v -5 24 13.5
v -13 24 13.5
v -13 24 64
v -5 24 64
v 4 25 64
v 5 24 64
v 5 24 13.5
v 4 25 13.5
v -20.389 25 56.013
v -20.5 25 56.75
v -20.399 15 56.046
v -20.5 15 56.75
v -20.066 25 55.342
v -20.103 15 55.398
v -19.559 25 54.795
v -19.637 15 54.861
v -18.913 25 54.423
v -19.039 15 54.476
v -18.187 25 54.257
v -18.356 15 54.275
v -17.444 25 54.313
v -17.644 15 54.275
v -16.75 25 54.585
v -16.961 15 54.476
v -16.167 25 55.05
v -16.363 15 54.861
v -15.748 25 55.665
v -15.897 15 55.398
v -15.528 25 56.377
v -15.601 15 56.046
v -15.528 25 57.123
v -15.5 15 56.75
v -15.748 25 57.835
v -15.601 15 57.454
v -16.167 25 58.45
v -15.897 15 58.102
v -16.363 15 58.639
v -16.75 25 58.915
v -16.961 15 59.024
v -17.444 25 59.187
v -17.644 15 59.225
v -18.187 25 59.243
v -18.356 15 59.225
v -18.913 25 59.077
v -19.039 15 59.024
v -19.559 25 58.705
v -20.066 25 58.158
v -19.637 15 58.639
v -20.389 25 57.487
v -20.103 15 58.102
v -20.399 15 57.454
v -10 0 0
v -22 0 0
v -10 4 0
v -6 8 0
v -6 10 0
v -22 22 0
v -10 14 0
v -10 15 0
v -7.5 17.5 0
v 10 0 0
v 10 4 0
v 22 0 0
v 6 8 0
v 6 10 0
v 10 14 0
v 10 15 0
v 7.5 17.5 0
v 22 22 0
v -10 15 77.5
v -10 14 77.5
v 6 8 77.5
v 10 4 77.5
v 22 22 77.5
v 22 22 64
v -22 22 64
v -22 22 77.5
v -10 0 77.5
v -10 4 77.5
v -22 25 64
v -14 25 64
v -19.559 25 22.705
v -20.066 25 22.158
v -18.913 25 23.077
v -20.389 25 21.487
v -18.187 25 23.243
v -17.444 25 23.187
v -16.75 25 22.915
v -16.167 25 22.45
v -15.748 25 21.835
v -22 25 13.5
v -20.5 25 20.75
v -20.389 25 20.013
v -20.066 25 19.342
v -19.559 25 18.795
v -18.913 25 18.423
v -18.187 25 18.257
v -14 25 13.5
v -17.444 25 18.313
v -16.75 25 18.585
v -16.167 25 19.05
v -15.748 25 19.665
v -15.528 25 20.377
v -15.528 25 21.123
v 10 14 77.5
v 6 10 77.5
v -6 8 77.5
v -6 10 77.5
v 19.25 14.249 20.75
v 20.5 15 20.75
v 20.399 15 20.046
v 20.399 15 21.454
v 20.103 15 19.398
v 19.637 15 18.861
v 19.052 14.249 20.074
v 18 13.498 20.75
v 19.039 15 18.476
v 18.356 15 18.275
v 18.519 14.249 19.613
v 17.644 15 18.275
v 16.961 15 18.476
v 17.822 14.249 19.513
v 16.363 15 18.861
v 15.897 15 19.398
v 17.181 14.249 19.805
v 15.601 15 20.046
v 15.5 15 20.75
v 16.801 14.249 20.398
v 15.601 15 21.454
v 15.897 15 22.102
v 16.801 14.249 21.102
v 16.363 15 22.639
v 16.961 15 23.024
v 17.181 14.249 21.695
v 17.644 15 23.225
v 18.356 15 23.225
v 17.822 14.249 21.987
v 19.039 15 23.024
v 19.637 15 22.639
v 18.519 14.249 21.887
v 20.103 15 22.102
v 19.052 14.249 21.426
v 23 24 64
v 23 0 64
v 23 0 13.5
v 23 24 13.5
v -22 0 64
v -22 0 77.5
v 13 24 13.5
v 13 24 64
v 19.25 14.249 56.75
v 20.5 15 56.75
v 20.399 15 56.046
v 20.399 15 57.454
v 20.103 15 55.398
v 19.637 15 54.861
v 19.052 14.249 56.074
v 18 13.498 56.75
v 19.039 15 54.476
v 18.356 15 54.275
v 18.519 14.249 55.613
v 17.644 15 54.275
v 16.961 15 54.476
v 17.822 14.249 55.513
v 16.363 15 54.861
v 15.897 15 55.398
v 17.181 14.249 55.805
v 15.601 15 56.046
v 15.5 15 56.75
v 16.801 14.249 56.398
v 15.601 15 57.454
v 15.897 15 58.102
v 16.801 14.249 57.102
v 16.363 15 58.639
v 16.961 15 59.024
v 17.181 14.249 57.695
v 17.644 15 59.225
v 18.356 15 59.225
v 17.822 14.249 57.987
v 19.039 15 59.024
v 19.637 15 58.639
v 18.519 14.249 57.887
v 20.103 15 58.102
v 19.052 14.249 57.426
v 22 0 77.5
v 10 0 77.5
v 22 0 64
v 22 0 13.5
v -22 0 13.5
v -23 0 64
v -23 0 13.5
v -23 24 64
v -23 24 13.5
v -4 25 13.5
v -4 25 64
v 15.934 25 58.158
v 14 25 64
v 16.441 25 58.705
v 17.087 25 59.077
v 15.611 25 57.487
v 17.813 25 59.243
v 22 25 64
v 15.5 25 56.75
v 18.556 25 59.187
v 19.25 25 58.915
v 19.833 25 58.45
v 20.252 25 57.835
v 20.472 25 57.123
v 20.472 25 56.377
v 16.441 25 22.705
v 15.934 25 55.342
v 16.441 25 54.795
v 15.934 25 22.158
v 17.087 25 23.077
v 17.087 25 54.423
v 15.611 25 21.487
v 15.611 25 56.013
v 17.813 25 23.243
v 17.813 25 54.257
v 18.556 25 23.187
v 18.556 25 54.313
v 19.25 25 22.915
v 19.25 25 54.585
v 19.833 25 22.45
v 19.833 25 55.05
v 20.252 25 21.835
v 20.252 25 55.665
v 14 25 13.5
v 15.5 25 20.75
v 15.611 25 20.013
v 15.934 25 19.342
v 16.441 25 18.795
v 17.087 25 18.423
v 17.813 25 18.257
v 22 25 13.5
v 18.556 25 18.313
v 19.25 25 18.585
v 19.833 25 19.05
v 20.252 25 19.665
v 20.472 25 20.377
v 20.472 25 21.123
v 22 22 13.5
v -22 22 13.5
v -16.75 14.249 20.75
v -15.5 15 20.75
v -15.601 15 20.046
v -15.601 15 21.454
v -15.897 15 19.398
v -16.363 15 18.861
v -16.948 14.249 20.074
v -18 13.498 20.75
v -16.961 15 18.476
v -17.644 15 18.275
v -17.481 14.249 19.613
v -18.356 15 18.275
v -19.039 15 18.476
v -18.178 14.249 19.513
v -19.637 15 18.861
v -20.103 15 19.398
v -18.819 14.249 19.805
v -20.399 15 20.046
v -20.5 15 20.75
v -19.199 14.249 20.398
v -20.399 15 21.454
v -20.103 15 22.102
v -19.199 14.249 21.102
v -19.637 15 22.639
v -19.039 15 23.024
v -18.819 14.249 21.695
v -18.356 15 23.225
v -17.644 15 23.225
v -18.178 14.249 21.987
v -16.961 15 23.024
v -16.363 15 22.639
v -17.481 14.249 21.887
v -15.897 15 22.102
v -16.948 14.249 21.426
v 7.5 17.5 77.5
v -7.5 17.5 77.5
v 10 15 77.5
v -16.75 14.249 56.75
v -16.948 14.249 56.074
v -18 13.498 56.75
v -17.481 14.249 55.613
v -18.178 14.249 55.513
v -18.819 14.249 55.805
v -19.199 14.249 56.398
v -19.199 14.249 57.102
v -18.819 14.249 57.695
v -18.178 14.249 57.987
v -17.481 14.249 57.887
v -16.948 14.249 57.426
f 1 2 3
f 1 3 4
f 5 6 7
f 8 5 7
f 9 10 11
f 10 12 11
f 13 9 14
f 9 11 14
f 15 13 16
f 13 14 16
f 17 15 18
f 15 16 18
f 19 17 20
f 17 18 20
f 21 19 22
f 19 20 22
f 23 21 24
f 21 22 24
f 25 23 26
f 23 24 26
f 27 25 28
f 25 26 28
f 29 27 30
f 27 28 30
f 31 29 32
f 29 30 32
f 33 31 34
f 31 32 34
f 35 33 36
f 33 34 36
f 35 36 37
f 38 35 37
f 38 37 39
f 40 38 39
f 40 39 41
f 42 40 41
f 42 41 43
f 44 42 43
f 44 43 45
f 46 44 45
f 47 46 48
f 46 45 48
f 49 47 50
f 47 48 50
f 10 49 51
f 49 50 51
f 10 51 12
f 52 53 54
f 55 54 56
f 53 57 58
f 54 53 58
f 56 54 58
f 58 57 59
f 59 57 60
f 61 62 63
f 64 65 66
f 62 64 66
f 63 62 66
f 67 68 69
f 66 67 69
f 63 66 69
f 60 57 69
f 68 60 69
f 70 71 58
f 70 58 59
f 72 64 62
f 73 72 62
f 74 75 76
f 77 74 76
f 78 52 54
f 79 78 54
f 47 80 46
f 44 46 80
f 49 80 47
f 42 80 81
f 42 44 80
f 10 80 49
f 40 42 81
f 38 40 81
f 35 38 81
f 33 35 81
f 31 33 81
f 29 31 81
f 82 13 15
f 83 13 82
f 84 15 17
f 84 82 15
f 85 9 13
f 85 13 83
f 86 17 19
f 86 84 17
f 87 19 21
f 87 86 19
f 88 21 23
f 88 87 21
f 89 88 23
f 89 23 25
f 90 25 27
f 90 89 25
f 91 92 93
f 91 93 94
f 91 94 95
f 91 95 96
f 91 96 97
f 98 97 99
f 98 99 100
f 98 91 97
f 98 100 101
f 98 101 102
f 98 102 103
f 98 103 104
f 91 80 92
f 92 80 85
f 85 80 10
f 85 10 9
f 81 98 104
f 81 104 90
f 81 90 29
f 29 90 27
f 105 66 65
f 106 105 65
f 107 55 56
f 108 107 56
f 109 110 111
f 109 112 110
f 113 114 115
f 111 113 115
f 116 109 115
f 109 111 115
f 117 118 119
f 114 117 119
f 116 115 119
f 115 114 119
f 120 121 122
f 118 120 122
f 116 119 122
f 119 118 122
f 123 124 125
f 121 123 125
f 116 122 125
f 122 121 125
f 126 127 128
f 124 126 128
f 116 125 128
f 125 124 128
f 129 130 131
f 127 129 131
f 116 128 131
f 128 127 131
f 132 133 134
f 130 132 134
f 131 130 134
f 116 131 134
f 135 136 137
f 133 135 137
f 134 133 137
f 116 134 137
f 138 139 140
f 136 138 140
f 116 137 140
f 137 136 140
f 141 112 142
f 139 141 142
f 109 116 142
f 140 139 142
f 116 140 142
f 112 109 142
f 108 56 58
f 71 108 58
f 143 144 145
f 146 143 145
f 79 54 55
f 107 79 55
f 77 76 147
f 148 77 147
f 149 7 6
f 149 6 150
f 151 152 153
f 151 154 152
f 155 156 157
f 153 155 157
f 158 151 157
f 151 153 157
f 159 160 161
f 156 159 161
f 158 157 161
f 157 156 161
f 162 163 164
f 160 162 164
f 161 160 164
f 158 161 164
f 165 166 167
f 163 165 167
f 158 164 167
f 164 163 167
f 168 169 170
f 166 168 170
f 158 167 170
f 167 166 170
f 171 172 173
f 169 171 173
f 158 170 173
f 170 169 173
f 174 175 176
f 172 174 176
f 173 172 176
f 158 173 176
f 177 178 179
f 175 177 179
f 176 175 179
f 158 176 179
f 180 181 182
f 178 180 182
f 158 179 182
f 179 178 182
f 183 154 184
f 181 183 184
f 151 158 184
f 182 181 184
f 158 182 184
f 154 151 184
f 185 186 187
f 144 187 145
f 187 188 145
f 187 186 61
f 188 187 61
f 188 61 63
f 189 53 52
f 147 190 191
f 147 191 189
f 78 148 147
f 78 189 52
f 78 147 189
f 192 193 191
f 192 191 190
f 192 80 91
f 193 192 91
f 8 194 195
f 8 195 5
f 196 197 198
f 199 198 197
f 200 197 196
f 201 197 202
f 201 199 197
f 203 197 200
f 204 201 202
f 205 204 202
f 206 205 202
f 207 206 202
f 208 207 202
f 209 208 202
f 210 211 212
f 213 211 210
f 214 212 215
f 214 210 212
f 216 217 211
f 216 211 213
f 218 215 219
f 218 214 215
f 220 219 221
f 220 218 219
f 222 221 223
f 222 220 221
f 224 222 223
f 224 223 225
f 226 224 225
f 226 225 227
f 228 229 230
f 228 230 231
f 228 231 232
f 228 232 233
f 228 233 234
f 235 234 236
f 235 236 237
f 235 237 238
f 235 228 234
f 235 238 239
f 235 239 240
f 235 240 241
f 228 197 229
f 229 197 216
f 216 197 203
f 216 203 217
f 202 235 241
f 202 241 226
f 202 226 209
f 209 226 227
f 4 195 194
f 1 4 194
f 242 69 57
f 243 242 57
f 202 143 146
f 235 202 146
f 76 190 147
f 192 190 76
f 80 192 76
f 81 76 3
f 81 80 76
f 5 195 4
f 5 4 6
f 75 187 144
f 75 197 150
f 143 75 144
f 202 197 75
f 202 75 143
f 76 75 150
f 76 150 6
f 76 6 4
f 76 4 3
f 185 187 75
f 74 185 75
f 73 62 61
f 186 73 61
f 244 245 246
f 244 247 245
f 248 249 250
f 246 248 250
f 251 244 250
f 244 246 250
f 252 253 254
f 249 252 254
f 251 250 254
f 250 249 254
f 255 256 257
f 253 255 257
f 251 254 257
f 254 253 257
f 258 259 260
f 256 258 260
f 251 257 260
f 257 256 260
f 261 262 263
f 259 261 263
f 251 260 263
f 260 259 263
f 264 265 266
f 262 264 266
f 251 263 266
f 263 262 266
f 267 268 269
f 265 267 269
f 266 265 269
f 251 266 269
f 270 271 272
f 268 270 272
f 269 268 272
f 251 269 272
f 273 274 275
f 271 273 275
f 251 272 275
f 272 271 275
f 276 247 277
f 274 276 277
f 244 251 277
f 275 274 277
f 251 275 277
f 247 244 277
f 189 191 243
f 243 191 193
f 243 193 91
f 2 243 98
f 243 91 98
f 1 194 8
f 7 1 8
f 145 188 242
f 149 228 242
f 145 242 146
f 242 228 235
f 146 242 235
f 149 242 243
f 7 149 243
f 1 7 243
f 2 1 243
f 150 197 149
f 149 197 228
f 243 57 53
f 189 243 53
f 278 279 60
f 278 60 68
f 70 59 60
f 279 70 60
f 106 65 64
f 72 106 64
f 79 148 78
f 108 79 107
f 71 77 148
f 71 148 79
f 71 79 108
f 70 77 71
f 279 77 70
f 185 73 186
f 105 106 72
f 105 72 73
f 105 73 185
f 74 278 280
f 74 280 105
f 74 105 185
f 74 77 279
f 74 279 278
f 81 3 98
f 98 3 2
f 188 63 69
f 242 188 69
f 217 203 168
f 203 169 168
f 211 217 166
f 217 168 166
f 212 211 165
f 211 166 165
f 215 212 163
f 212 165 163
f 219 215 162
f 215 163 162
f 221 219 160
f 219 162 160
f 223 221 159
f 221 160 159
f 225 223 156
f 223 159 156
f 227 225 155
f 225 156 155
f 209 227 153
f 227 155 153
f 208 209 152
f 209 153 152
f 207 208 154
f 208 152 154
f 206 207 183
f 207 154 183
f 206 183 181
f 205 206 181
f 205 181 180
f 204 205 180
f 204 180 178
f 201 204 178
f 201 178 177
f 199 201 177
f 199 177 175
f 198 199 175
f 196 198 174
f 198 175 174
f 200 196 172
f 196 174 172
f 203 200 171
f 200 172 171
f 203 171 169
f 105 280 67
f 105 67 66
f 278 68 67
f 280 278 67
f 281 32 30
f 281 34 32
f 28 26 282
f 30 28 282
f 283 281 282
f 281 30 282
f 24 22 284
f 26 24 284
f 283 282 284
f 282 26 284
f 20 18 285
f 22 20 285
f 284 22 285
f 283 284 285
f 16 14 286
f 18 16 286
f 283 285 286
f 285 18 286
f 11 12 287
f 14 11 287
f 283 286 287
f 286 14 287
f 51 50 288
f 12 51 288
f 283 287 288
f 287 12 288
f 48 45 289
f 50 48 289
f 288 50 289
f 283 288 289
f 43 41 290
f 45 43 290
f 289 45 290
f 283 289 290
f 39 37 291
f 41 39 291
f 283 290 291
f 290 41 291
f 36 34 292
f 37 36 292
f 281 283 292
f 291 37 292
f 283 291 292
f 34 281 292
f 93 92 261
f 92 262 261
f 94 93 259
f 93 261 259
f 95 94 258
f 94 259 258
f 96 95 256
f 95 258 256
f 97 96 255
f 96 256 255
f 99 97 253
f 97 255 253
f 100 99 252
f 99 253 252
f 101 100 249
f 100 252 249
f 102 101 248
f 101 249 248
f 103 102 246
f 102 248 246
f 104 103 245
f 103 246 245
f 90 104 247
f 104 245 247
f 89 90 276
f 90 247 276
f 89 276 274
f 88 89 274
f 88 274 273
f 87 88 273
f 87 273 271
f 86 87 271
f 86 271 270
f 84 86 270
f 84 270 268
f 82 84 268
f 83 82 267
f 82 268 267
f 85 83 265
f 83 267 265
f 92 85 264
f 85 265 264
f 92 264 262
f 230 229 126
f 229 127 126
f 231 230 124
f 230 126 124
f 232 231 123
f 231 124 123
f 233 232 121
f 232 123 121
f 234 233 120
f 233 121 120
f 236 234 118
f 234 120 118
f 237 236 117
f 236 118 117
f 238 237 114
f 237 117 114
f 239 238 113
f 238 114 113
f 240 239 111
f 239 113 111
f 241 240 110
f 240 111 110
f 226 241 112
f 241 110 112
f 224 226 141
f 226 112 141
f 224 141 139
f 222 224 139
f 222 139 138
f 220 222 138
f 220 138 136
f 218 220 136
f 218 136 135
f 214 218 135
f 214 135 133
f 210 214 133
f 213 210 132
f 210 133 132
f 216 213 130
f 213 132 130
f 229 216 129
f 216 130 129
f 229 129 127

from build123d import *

# Parameters (mm, degrees)
DODANIE_WYCI_GNI_CIE1_DEPTH    = 77.5
SZKIC2_W                       = 46
SZKIC2_H                       = 50.5
DODANIE_WYCI_GNI_CIE2_DEPTH    = 3
SZKIC3_W                       = 1
SZKIC3_H                       = 50.5
DODANIE_WYCI_GNI_CIE3_DEPTH    = 22
SZKIC4_W                       = 8
SZKIC4_H                       = 50.5
WYTNIJ_WYCI_GNI_CIE1_DEPTH     = 1
SFAZOWANIE1_SIZE               = 1
OTWORY_USTALAJ_CE_5_0MM1_D     = 5
OTWORY_USTALAJ_CE_5_0MM1_DEPTH = 10
OTWORY_USTALAJ_CE_5_0MM1_TIP   = 1.502151548


with BuildPart() as part:
    # Szkic1 → Dodanie-wyciągnięcie1 (new body)
    with BuildSketch(Plane.XY):
        Polygon((-10, 0), (-10, 4), (-6, 8), (-6, 10), (-10, 14), (-10, 15), (-7.5, 17.5), (7.5, 17.5), (10, 15), (10, 14), (6, 10), (6, 8), (10, 4), (10, 0), (22, 0), (22, 22), (-22, 22), (-22, 0), align=None)
    extrude(amount=DODANIE_WYCI_GNI_CIE1_DEPTH)

    # Szkic2 → Dodanie-wyciągnięcie2 (add)
    with BuildSketch(Plane(origin=(0, 22, 0), x_dir=(1, 0, 0), z_dir=(0, 1, 0))):
        with Locations((0, -38.75)):
            Rectangle(SZKIC2_W, SZKIC2_H)
    extrude(amount=DODANIE_WYCI_GNI_CIE2_DEPTH)

    # Szkic3 → Dodanie-wyciągnięcie3 (add)
    with BuildSketch(Plane.XZ.offset(-22)):
        with Locations((-22.5, 38.75)):
            Rectangle(SZKIC3_W, SZKIC3_H)
        with Locations((22.5, 38.75)):
            Rectangle(SZKIC3_W, SZKIC3_H)
    extrude(amount=DODANIE_WYCI_GNI_CIE3_DEPTH)

    # Szkic4 → Wytnij-wyciągnięcie1 (cut)
    with BuildSketch(Plane(origin=(0, 25, 0), x_dir=(1, 0, 0), z_dir=(0, 1, 0))):
        with Locations((-9, -38.75)):
            Rectangle(SZKIC4_W, SZKIC4_H)
        with Locations((9, -38.75)):
            Rectangle(SZKIC4_W, SZKIC4_H)
    extrude(amount=-WYTNIJ_WYCI_GNI_CIE1_DEPTH, mode=Mode.SUBTRACT)

    # Sfazowanie1
    sfazowanie1_edges = [part.edges().sort_by_distance(p)[0] for p in [
        (-23, 25, 38.75),
        (-13, 25, 38.75),
        (-5, 25, 38.75),
        (5, 25, 38.75),
        (13, 25, 38.75),
        (23, 25, 38.75),
    ]]
    chamfer(sfazowanie1_edges, length=SFAZOWANIE1_SIZE - 0.0001)  # a hair under: the kernel refuses the full size

    # Otwory ustalające Ø5.0mm1
    with Locations(Plane(origin=(0, 25, 0), x_dir=(1, 0, 0), z_dir=(0, 1, 0))):
        with Locations((-18, -20.75), (18, -20.75), (18, -56.75), (-18, -56.75)):
            Hole(OTWORY_USTALAJ_CE_5_0MM1_D / 2, depth=OTWORY_USTALAJ_CE_5_0MM1_DEPTH)
            with Locations((0, 0, -(OTWORY_USTALAJ_CE_5_0MM1_DEPTH + OTWORY_USTALAJ_CE_5_0MM1_TIP / 2))):  # 118° drill point
                Cone(0, OTWORY_USTALAJ_CE_5_0MM1_D / 2, OTWORY_USTALAJ_CE_5_0MM1_TIP, mode=Mode.SUBTRACT)


solid = part.part
